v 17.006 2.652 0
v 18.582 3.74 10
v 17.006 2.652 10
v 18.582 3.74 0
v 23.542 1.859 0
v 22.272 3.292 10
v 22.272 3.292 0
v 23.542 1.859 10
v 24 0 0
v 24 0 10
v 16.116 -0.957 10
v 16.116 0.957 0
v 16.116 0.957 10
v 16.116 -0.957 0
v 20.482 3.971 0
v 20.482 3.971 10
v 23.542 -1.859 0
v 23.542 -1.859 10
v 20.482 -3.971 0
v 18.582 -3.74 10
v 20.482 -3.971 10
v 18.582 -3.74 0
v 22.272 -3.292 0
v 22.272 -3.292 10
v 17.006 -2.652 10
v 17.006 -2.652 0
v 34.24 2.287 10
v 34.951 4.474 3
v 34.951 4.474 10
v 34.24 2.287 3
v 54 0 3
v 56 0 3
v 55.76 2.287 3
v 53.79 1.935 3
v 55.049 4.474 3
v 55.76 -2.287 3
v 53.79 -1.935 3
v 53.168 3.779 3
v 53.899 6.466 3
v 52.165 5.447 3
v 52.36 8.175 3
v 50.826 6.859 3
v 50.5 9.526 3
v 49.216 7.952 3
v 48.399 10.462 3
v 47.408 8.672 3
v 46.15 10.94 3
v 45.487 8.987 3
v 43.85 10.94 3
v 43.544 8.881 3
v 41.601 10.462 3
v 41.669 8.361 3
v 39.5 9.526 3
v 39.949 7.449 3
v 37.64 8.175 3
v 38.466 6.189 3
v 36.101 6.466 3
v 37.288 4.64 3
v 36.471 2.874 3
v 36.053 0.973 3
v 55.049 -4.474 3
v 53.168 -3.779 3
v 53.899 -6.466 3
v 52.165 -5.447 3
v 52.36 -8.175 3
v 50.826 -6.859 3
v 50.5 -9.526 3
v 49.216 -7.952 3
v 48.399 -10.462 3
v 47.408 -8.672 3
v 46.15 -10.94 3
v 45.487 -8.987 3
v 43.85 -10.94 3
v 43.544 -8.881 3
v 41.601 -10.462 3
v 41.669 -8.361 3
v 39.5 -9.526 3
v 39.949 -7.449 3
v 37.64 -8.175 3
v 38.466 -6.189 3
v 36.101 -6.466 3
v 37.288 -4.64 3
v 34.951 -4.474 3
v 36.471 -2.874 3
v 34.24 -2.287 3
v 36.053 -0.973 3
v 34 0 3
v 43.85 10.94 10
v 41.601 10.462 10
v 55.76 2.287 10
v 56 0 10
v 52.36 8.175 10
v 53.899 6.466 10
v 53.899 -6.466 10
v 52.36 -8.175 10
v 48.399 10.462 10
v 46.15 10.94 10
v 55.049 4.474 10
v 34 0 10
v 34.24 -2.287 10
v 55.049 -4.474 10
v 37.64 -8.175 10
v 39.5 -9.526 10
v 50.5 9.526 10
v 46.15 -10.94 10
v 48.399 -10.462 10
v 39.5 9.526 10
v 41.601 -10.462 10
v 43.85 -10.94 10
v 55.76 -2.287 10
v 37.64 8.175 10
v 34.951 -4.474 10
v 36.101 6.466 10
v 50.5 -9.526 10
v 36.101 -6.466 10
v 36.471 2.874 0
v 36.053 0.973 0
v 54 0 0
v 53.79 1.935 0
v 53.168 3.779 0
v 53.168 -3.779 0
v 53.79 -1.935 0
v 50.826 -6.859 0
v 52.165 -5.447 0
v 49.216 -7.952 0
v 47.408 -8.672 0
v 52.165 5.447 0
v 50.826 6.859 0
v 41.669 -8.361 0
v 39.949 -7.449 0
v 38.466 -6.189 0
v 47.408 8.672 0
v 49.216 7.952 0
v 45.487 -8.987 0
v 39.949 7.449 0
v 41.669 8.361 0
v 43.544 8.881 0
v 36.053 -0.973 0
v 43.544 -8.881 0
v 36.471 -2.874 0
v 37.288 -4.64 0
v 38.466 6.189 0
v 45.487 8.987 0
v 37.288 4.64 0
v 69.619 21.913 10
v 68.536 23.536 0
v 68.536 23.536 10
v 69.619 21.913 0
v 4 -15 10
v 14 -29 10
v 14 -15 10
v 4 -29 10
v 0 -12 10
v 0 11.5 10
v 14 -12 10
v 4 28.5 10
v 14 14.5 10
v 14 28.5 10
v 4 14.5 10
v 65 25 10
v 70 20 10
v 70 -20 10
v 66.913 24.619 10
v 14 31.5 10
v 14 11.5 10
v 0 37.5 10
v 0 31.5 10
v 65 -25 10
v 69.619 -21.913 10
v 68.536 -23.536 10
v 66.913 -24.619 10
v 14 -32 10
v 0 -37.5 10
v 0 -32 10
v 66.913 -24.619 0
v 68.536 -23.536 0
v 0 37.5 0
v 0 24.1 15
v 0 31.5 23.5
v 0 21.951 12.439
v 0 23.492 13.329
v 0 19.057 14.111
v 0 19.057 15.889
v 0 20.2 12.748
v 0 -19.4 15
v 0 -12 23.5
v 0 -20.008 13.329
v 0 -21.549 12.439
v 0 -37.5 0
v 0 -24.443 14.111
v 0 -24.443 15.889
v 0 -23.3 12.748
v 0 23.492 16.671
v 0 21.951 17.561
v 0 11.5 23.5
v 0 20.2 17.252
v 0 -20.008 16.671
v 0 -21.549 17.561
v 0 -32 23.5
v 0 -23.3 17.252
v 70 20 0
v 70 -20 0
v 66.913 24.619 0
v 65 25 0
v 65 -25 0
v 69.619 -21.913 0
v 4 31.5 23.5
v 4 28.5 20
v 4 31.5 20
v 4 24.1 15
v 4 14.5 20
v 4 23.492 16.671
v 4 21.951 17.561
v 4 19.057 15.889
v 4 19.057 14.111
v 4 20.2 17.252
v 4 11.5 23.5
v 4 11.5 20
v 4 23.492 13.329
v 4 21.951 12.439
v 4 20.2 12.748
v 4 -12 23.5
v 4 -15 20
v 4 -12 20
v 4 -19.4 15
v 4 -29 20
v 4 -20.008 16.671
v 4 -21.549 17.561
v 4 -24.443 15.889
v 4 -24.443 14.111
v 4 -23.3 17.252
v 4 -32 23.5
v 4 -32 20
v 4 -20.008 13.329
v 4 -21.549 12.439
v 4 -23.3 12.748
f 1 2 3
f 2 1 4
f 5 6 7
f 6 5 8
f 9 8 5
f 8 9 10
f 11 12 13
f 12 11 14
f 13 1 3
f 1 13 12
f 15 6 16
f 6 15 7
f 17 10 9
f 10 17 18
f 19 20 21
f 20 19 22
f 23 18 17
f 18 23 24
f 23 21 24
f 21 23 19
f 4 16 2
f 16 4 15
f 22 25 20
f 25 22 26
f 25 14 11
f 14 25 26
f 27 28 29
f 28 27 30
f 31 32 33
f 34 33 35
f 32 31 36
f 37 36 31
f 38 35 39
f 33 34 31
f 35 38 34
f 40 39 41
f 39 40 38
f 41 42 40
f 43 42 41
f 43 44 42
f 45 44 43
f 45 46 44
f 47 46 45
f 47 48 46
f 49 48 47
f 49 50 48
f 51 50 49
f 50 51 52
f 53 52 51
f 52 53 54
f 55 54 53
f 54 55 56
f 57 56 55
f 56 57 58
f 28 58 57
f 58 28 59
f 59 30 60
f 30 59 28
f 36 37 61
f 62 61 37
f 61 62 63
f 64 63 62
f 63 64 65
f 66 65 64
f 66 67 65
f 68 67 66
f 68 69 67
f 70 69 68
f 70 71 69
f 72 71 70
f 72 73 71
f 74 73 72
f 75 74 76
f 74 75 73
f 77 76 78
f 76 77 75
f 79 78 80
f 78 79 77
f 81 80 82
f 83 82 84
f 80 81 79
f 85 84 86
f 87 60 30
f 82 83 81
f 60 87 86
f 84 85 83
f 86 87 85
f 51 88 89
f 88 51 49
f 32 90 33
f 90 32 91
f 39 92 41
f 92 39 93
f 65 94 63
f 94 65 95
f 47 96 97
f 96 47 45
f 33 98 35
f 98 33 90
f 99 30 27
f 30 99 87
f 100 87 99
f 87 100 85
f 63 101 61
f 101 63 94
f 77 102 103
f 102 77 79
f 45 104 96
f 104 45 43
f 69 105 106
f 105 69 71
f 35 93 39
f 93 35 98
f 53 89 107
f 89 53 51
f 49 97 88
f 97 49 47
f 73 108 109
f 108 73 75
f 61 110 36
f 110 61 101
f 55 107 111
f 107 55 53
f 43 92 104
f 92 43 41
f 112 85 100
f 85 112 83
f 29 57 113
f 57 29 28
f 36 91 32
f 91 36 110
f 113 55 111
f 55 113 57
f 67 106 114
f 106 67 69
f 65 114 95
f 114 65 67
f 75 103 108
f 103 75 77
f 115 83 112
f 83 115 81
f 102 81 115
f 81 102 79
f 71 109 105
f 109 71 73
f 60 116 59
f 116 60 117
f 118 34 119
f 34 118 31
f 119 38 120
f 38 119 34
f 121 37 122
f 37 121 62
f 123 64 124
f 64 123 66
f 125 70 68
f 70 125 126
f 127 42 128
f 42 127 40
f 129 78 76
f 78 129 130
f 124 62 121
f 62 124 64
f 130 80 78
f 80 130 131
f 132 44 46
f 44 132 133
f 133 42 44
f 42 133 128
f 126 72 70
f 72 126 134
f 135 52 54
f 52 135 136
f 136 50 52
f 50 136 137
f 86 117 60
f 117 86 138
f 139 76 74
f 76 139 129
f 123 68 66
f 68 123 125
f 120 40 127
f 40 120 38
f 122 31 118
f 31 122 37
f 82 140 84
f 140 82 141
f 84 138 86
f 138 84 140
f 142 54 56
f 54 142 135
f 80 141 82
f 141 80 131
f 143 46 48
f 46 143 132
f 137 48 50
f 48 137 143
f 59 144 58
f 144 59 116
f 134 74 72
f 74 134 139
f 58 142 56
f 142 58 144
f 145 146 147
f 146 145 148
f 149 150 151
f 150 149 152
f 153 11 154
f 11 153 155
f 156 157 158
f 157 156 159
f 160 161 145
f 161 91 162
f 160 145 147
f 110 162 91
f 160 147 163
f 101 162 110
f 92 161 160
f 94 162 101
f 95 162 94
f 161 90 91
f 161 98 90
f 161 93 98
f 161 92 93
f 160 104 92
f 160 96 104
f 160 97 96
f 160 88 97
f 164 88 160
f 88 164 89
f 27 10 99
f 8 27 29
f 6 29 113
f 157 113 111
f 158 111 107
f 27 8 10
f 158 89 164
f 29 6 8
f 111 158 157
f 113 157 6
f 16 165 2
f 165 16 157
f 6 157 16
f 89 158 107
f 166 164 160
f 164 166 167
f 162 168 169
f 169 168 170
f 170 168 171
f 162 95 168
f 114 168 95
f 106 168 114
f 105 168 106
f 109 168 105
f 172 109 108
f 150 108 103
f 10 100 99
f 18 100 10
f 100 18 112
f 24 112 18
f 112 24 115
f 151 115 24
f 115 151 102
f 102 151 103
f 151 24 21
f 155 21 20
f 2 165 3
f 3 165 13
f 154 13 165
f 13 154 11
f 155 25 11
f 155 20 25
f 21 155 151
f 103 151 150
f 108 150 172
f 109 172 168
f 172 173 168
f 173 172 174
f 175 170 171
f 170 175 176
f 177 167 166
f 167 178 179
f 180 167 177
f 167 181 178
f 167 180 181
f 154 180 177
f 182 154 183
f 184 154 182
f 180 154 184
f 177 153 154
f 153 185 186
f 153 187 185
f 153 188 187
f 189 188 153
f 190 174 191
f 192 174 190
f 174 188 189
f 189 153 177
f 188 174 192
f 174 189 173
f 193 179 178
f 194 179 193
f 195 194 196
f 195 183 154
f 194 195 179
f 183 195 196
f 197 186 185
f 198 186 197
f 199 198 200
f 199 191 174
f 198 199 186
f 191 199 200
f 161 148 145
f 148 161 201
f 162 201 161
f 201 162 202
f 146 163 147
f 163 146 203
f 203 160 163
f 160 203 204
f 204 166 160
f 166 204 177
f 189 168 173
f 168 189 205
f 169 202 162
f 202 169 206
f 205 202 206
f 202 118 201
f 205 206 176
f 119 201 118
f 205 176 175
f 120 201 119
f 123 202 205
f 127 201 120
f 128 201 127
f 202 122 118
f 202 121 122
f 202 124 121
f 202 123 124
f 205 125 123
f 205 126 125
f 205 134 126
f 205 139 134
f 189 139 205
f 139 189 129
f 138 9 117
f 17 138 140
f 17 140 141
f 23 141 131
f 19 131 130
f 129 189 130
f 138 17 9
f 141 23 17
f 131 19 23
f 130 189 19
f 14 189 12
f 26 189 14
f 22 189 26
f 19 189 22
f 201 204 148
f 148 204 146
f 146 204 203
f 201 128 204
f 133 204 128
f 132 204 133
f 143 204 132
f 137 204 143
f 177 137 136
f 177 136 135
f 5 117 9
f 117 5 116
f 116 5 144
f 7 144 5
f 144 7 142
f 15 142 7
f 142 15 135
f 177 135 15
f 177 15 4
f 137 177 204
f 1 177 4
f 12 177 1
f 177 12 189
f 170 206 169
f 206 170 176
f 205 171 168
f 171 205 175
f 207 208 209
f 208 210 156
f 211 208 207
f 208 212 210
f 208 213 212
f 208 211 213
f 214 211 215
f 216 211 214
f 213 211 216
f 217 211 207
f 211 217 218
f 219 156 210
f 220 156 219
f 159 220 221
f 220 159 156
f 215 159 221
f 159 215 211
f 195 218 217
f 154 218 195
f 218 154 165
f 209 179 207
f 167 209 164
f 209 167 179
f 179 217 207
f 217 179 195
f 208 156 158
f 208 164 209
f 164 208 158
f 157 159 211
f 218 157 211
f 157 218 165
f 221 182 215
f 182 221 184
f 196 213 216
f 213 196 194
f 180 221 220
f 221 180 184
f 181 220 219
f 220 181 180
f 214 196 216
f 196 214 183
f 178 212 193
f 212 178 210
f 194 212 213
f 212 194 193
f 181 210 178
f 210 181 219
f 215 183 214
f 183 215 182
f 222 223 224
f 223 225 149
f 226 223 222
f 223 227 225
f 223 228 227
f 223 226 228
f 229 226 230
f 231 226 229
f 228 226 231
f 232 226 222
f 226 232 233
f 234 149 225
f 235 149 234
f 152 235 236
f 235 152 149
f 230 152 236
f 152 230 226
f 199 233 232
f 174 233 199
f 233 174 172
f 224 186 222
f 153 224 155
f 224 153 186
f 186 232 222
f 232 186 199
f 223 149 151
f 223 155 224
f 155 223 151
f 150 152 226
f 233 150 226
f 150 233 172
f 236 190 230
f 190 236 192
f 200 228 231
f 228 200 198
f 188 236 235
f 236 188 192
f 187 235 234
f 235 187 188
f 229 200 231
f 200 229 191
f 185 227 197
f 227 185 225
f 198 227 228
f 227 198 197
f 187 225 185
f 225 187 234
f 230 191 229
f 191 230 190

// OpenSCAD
z_shelf_depth = 70;
z_shelf_round_radius = 5;
z_shelf_small_width = 40;
z_shelf_large_width = 75;
z_shelf_height = 10;

z_shelf_bearing_pos = 45;
z_shelf_bearing_depth = 7;

z_shelf_rod_pos = 20;

rod_radius = 4;
bearing_radius = 11;

tab_width = 13.5;

module z_shelf_2d() {

	hull(){	
		translate([z_shelf_depth - z_shelf_round_radius, z_shelf_small_width / 2]) 
			circle(r=z_shelf_round_radius);	
		translate([z_shelf_depth - z_shelf_round_radius, -z_shelf_small_width / 2])
			circle(r=z_shelf_round_radius);	
		polygon(points=[
			[0, z_shelf_large_width/2], 
			[z_shelf_depth, z_shelf_small_width/2 ],
			[z_shelf_depth, -z_shelf_small_width/2 ],
			[0, -z_shelf_large_width/2],
		]);
	}

}

//z_shelf_2d();

module z_shelf_bearing(){

	bearing_holder = z_shelf_height - z_shelf_bearing_depth; 

	difference(){

		linear_extrude(height=10) z_shelf_2d();

		union(){	
			// hole for rod
			translate([z_shelf_rod_pos, 0, -1]){
				cylinder(h=z_shelf_height + 2, r=rod_radius);
			}
			
			// hole for bearing
			translate([z_shelf_bearing_pos, 0, bearing_holder]){
				cylinder(h=z_shelf_height, r=bearing_radius);
			}

			// hole for rod through bearing
			translate([z_shelf_bearing_pos, 0, -1]){
				cylinder(h=z_shelf_height + 2, r=bearing_radius - 2);
			}

		}
	}

}

z_shelf_bearing();
translate([0, z_shelf_large_width/2 - 6, z_shelf_height]) tab();
translate([0, - (z_shelf_large_width/2 - 6 - tab_width - 6), z_shelf_height]) tab();

module tab() {

		rotate([90,0,0]) 
		difference() {
			union() {
				cube([4,tab_width,20]);
				translate([4,0,0]) linear_extrude(height=3) polygon(points=[[0,0],[0,10],[10,0]]);
				translate([4,0,17]) linear_extrude(height=3) polygon(points=[[0,0],[0,10],[10,0]]);
		}
		translate([-1,5,10]) rotate([0,90,0]) cylinder(r=2.6, h=6);
	}

}
